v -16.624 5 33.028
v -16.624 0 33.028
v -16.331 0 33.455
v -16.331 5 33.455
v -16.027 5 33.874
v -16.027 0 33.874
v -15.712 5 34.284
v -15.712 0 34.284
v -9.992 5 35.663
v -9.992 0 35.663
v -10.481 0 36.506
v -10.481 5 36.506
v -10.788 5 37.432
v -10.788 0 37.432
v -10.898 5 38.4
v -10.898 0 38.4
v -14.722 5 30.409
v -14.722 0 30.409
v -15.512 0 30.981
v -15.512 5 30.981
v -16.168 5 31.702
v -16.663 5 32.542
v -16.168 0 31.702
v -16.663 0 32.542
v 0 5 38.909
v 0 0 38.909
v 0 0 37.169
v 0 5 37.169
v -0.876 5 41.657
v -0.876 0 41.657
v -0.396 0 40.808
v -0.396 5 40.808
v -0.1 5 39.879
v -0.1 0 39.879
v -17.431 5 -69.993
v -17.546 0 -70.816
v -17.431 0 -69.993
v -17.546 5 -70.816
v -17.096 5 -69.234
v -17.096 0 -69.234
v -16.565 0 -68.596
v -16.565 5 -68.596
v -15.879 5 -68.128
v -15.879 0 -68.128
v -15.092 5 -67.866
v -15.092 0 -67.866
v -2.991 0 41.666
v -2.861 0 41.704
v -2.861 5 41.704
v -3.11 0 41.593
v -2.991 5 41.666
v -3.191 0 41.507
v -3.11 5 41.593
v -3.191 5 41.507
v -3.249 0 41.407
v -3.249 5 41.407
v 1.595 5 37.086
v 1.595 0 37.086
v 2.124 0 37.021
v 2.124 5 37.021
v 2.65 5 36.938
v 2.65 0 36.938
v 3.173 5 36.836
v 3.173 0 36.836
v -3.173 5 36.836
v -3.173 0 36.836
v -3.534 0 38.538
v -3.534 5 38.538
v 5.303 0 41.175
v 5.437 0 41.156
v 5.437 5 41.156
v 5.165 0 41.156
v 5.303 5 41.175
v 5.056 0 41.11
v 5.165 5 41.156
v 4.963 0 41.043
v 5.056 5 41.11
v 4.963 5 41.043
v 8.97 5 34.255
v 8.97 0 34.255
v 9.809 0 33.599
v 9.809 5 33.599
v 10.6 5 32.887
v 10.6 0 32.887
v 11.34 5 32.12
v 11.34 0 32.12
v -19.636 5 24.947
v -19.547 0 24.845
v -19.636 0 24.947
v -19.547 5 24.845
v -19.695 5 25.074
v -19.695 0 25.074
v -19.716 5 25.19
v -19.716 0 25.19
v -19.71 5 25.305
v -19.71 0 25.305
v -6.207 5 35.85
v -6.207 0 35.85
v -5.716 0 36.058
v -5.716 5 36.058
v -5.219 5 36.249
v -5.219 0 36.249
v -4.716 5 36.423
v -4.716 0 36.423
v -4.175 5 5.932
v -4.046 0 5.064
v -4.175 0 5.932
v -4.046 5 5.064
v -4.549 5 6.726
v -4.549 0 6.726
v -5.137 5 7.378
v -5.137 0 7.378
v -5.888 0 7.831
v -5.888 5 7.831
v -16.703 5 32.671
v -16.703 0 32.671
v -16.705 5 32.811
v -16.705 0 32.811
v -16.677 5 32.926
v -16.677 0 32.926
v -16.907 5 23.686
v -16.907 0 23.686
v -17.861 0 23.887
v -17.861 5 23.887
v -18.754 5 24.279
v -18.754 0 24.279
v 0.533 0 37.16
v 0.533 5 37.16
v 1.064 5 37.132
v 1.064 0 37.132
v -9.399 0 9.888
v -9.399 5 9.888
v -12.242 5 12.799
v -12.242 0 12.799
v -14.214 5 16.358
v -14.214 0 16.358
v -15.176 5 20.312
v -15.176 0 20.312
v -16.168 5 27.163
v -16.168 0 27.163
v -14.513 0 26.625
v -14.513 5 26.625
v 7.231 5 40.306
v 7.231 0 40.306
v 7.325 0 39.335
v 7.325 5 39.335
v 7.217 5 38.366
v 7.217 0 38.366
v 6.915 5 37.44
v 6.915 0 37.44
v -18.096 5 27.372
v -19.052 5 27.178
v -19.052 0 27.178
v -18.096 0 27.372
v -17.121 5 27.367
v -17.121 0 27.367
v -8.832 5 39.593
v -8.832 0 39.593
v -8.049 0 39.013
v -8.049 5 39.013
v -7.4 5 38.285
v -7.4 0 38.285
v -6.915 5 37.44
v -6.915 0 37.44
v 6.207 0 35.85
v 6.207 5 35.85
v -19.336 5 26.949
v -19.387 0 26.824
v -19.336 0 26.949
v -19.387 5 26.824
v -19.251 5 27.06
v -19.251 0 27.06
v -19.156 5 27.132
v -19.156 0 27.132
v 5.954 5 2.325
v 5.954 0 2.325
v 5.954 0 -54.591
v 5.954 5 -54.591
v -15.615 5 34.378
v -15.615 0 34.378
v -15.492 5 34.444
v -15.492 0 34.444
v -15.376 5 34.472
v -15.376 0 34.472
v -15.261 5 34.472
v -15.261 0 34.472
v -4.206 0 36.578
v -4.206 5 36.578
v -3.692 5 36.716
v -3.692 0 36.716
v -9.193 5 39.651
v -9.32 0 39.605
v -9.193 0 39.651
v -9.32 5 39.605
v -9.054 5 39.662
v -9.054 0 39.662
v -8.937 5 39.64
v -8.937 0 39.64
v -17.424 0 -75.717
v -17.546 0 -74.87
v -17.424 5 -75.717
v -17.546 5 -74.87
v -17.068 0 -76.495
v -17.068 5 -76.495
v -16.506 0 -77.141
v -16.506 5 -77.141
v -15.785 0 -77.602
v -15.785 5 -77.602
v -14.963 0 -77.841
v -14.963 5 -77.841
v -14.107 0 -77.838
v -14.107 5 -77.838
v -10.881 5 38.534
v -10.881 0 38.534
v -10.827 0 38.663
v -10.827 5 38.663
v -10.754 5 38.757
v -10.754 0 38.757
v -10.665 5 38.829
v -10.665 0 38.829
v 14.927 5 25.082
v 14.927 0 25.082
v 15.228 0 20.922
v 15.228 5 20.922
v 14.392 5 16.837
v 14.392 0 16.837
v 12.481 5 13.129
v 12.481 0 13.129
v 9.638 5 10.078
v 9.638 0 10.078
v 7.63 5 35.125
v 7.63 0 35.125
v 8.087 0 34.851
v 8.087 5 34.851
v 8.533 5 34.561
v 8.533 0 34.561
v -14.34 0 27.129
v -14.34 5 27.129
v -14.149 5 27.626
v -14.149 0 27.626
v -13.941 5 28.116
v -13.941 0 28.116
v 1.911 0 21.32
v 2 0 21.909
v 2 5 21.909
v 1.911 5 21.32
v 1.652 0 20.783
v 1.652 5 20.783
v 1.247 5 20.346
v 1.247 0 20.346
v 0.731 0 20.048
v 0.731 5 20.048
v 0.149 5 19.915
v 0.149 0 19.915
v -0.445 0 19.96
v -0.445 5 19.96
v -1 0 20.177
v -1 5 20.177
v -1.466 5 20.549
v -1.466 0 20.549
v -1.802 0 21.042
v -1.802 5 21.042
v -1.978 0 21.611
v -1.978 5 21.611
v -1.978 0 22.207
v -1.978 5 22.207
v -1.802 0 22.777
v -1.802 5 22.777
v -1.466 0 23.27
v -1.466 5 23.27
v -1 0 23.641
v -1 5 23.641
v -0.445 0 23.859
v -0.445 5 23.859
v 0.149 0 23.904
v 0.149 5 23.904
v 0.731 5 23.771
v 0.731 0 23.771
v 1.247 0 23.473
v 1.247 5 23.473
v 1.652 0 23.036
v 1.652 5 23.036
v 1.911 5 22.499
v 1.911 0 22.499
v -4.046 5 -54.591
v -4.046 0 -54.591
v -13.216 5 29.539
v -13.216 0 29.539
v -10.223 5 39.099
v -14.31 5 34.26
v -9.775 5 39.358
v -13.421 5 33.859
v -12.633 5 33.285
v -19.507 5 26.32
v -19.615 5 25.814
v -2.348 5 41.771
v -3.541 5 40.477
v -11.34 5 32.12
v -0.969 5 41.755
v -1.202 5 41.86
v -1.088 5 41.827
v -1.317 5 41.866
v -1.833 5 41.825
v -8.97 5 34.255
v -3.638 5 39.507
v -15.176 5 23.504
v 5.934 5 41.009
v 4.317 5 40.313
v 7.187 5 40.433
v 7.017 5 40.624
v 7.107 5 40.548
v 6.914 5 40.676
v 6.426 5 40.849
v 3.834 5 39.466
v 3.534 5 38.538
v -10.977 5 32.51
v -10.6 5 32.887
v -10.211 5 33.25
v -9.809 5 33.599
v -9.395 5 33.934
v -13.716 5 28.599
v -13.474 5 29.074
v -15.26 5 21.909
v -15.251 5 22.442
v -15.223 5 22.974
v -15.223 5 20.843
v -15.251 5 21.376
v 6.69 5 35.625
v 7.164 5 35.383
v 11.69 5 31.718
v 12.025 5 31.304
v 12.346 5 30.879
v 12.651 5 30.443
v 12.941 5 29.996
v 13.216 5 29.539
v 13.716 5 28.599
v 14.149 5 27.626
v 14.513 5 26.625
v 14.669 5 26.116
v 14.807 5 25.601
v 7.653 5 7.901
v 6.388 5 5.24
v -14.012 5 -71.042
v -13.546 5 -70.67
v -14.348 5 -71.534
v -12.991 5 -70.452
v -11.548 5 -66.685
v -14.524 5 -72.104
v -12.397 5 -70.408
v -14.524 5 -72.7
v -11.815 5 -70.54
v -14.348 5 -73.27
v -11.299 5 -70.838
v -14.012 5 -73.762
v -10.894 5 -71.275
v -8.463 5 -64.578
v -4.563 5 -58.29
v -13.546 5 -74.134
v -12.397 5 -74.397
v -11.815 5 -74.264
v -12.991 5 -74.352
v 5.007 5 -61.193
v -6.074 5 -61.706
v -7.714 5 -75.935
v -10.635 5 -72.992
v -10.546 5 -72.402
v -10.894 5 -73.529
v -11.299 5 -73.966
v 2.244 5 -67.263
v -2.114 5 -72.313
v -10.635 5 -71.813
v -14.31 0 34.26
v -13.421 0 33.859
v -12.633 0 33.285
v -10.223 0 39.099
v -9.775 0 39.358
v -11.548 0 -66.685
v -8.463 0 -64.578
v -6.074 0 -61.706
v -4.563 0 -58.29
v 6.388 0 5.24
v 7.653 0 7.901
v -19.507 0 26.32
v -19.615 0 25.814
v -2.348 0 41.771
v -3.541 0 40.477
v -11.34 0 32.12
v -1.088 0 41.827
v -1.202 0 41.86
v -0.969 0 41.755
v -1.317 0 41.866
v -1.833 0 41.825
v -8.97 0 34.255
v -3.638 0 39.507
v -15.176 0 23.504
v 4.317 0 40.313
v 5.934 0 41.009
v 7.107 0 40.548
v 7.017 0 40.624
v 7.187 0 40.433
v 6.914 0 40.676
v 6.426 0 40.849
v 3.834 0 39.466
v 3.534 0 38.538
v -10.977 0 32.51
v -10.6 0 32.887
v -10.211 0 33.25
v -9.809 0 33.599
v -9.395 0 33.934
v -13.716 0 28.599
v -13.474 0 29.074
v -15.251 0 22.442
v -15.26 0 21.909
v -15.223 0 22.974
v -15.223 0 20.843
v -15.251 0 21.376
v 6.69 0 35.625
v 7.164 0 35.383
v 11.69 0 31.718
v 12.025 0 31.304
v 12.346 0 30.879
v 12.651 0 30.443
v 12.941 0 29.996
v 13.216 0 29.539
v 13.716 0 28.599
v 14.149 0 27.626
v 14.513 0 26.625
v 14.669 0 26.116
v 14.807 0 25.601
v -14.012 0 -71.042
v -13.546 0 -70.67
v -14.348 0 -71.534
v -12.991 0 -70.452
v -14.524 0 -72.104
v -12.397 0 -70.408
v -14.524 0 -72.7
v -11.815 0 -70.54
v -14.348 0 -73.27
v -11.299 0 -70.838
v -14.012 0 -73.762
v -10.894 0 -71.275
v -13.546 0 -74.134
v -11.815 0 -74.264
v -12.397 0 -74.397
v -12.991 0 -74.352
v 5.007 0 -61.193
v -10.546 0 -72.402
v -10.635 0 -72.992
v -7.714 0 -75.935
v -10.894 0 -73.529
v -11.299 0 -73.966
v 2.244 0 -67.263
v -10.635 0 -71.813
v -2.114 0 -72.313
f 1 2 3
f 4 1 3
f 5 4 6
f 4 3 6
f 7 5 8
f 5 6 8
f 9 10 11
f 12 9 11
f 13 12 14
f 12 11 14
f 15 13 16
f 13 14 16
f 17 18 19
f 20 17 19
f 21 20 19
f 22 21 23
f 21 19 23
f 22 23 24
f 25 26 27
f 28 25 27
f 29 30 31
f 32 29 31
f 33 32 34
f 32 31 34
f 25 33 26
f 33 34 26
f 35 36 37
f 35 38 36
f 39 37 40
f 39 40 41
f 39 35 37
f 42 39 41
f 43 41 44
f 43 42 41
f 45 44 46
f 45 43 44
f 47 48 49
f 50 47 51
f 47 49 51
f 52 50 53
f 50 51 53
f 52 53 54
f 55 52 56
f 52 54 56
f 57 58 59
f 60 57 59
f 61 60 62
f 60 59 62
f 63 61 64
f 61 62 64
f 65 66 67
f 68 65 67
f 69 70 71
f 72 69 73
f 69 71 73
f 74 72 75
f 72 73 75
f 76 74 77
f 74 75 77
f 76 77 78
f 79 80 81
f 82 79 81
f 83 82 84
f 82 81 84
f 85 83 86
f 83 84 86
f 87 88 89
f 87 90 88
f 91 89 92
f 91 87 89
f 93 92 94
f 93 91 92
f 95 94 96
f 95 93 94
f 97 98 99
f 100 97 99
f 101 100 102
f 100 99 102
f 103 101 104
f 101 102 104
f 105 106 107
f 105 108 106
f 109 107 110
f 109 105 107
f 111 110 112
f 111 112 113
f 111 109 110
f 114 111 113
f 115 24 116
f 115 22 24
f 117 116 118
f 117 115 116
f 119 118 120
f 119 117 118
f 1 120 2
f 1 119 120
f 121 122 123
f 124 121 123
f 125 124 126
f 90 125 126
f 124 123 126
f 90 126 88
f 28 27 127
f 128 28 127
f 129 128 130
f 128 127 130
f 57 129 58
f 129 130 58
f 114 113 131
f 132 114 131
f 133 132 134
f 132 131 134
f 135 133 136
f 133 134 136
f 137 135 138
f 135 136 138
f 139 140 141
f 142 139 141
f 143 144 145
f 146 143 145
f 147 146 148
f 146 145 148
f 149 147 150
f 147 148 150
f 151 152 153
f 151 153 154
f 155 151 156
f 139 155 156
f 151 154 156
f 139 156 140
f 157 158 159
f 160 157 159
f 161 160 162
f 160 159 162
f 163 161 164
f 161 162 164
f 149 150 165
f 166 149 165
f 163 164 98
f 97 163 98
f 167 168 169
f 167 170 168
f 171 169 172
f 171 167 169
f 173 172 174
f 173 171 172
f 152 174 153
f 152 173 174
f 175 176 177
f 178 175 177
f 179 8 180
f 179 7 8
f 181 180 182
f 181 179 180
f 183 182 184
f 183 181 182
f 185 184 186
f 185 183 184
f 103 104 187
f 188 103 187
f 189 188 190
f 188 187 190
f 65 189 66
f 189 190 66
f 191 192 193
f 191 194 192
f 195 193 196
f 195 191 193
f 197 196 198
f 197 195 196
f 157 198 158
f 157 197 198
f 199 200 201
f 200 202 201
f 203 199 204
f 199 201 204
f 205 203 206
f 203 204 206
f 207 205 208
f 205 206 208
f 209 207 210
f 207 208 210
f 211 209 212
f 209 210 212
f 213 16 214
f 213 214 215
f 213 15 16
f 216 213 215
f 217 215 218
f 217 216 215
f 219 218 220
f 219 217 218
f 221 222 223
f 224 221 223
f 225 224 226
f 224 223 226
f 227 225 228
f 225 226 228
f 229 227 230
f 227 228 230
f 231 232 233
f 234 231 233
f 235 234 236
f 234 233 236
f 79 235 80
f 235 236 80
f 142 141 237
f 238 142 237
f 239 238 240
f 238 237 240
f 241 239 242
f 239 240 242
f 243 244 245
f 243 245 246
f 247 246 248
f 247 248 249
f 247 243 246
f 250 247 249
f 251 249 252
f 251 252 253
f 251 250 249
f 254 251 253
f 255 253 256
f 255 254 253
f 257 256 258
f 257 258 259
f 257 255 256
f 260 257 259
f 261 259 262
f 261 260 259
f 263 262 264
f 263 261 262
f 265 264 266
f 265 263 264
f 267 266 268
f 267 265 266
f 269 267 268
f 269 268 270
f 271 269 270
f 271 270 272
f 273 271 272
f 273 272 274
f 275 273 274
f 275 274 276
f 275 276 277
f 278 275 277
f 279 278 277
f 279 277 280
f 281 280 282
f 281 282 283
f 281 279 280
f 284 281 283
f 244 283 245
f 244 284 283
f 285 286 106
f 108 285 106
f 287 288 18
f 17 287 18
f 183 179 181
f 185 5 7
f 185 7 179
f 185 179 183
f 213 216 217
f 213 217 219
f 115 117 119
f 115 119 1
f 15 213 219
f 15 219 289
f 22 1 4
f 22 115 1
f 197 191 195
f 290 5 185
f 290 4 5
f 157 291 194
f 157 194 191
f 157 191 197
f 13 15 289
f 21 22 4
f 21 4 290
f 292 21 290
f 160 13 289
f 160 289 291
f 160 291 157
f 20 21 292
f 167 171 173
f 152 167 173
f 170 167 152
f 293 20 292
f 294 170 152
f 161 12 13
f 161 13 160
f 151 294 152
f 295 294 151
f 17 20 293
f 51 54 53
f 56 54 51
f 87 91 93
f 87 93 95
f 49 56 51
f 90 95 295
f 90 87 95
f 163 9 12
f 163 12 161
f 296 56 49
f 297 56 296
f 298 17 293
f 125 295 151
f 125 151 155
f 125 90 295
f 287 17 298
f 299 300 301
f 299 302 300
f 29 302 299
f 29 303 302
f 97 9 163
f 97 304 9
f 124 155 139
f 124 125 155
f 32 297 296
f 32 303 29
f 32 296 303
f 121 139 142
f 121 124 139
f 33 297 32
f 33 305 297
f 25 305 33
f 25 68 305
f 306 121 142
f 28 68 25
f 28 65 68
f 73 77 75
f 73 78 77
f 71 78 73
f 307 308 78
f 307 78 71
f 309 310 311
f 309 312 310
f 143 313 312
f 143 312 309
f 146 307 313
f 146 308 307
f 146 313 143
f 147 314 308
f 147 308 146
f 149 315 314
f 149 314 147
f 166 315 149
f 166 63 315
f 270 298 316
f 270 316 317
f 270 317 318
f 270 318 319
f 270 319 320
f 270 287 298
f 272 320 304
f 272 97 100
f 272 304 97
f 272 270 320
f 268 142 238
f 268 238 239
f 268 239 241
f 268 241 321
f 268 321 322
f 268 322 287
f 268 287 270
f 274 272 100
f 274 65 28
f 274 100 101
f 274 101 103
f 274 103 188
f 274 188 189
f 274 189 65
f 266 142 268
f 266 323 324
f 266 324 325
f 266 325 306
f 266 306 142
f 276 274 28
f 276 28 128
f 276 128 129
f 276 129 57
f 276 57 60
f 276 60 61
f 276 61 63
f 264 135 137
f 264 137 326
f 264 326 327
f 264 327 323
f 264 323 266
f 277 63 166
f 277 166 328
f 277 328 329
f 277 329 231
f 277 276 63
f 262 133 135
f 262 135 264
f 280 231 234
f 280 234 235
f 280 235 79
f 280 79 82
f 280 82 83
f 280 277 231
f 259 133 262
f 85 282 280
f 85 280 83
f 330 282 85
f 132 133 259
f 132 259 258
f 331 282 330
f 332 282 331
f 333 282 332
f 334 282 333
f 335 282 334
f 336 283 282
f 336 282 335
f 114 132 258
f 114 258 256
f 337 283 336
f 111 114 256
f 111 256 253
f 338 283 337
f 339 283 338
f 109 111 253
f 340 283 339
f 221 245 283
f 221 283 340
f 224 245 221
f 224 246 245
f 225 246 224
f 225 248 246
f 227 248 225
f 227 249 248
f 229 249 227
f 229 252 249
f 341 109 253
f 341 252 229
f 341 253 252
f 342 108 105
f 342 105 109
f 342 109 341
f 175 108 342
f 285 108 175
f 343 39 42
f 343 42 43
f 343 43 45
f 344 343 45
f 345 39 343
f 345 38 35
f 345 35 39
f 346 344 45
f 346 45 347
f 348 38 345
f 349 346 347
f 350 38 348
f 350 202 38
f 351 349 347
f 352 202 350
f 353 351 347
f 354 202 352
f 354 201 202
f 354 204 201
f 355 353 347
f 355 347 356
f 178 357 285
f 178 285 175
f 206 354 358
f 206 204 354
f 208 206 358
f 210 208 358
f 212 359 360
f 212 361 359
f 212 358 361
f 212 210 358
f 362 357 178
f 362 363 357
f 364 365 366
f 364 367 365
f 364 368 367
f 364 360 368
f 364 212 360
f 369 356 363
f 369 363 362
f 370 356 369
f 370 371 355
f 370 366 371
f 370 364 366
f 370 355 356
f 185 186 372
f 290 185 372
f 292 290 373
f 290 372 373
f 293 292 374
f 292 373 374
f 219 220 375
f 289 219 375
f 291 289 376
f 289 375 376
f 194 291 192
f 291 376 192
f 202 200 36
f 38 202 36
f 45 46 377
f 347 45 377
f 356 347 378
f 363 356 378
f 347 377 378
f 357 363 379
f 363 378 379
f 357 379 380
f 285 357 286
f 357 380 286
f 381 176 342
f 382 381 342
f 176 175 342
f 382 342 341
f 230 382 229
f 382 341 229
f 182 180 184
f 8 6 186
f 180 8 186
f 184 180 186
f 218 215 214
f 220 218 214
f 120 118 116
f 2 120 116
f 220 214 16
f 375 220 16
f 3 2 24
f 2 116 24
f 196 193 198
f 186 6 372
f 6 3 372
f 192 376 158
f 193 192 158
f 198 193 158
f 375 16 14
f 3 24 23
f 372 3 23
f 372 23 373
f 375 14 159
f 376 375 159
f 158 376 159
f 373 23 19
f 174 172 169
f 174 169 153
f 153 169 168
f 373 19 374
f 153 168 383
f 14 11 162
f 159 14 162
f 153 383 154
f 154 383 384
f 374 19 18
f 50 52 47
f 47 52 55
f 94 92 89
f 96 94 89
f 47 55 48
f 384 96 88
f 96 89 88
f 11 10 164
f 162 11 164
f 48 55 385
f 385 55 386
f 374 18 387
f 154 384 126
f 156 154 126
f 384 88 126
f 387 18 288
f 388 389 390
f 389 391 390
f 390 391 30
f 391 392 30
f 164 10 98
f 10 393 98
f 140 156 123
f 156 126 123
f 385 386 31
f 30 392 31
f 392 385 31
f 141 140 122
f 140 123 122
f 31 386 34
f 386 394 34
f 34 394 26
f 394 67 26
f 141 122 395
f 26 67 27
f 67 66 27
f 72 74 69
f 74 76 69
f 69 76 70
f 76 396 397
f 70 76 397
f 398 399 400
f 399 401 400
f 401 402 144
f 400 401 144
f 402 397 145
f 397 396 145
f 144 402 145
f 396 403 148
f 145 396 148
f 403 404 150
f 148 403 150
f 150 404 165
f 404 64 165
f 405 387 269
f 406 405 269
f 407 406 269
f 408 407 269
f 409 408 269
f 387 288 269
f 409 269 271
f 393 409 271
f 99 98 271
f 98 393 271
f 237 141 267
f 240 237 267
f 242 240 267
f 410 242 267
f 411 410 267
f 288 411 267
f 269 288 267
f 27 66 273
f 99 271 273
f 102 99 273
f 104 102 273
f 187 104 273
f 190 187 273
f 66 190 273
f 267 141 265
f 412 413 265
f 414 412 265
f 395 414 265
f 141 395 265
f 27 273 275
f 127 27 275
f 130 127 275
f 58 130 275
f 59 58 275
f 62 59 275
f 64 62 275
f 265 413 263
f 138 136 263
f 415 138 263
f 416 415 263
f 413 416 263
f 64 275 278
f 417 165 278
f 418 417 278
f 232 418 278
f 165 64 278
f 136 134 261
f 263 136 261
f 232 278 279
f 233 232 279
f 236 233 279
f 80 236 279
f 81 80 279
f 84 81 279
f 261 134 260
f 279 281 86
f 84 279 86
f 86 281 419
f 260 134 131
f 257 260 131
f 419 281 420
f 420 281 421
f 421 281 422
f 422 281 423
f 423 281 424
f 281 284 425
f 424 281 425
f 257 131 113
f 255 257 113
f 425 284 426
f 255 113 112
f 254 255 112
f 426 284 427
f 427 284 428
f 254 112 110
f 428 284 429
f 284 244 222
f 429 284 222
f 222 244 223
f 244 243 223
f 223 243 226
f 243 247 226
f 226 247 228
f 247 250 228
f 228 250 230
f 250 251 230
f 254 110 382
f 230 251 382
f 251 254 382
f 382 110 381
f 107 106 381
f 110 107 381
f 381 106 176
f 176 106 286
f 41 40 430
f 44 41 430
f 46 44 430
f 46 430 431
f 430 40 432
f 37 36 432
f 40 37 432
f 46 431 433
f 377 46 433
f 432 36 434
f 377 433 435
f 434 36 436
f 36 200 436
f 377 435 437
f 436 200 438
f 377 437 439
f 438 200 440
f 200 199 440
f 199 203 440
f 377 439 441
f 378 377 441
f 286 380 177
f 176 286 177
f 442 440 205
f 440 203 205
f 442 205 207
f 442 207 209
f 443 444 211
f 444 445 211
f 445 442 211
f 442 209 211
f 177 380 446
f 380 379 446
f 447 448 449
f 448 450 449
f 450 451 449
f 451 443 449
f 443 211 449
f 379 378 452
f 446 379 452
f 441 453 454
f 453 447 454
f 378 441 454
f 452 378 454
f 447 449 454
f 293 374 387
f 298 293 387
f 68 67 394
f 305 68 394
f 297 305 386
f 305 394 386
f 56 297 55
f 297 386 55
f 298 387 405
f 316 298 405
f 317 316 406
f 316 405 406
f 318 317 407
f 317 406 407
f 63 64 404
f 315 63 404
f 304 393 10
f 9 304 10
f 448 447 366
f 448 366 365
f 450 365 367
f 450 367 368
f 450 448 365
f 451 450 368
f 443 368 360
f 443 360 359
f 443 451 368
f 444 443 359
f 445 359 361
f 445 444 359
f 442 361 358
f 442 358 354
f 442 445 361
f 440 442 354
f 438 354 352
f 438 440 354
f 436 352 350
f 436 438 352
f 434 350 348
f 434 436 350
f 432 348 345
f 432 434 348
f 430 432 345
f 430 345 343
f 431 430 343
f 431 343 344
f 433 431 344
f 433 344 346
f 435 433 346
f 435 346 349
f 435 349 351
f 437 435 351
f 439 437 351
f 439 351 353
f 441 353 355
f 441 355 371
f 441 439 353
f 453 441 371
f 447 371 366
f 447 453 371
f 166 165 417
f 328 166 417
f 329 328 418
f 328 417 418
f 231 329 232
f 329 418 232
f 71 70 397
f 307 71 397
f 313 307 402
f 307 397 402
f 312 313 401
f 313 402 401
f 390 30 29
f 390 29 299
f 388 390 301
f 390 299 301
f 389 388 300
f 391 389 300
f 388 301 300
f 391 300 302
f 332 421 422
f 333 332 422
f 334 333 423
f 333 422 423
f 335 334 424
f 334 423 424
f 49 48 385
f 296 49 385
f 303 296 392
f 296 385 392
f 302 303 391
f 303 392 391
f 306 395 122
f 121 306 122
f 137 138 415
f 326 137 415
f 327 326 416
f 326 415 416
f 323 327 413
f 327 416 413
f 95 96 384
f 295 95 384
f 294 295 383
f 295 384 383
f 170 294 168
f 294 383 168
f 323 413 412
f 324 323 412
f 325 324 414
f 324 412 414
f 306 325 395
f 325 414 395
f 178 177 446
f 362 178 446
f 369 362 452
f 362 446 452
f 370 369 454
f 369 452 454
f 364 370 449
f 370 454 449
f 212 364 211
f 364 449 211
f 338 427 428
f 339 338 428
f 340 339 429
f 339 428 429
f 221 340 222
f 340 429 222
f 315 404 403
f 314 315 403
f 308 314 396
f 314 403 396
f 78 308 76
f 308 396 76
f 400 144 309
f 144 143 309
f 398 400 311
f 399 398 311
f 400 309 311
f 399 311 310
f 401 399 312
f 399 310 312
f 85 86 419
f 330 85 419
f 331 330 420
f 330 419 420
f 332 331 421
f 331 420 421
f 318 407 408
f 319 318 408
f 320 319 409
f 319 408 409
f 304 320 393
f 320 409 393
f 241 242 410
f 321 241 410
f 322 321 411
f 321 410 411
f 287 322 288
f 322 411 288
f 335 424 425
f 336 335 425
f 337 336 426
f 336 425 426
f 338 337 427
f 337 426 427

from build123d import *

# Parameters (mm, degrees)
SKETCH1_R           = 2
BOSS_EXTRUDE3_DEPTH = 5
FILLET9_R           = 10
FILLET10_R          = 3
FILLET11_R          = 3
FILLET12_R          = 3
FILLET13_R          = 0.5


with BuildPart() as part:
    # Sketch1 → Boss-Extrude3 (new body)
    with BuildSketch(Plane(origin=(0, 0, 0), x_dir=(1, 0, 0), z_dir=(0, 1, 0))):
        with BuildLine():
            Line((-4.046119318, 54.590604732), (-4.046119318, -7.195574606))
            ThreePointArc((-4.046119318, -7.195574606), (-11.635335702, -12.035866866), (-15.176119318, -20.311583503))
            ThreePointArc((-15.176119318, -20.311583503), (-15.239015435, -21.109389908), (-15.26, -21.909396551))
            ThreePointArc((-15.26, -21.909396551), (-15.239086668, -22.708042569), (-15.17640413, -23.504499555))
            Line((-15.17640413, -23.504499555), (-16.906872391, -23.686379161))
            ThreePointArc((-16.906872391, -23.686379161), (-18.44583537, -24.118938522), (-19.753766933, -25.038084689))
            ThreePointArc((-19.753766933, -25.038084689), (-19.56295199, -26.067629867), (-19.318516287, -27.085777598))
            ThreePointArc((-19.318516287, -27.085777598), (-17.749810888, -27.393475541), (-16.167960532, -27.162685373))
            Line((-16.167960532, -27.162685373), (-14.513122101, -26.624995641))
            ThreePointArc((-14.513122101, -26.624995641), (-14.246436916, -27.378091201), (-13.940703236, -28.116197446))
            ThreePointArc((-13.940703236, -28.116197446), (-13.596759365, -28.837290674), (-13.215547785, -29.539395055))
            Line((-13.215547785, -29.539395055), (-14.722432114, -30.409395176))
            ThreePointArc((-14.722432114, -30.409395176), (-15.952407023, -31.430510437), (-16.773411552, -32.802175926))
            ThreePointArc((-16.773411552, -32.802175926), (-16.180339688, -33.665100824), (-15.542918581, -34.49580411))
            ThreePointArc((-15.542918581, -34.49580411), (-13.984682857, -34.138850219), (-12.633461458, -33.284616422))
            Line((-12.633461458, -33.284616422), (-11.340389428, -32.120328997))
            ThreePointArc((-11.340389428, -32.120328997), (-10.790448835, -32.699845394), (-10.210932372, -33.249785918))
            ThreePointArc((-10.210932372, -33.249785918), (-9.603428978, -33.768642793), (-8.969603297, -34.25499435))
            Line((-8.969603297, -34.25499435), (-9.99234972, -35.66268407))
            ThreePointArc((-9.99234972, -35.66268407), (-10.700662735, -37.095795135), (-10.892781095, -38.682806536))
            ThreePointArc((-10.892781095, -38.682806536), (-9.999999818, -39.229903609), (-9.079809202, -39.729526311))
            ThreePointArc((-9.079809202, -39.729526311), (-7.80147625, -38.769641154), (-6.914522249, -37.439668504))
            Line((-6.914522249, -37.439668504), (-6.20680051, -35.850099247))
            ThreePointArc((-6.20680051, -35.850099247), (-5.468694229, -36.155832838), (-4.715598637, -36.422517933))
            ThreePointArc((-4.715598637, -36.422517933), (-3.94957857, -36.649423393), (-3.172733001, -36.835927528))
            Line((-3.172733001, -36.835927528), (-3.534499379, -38.53790452))
            ThreePointArc((-3.534499379, -38.53790452), (-3.598676752, -40.135213481), (-3.128689936, -41.66316212))
            ThreePointArc((-3.128689936, -41.66316212), (-2.09056923, -41.799833318), (-1.046718412, -41.881986139))
            ThreePointArc((-1.046718412, -41.881986139), (-0.269323601, -40.48514257), (6.05e-07, -38.909395406))
            Line((6.05e-07, -38.909395406), (5.43e-07, -37.169395268))
            ThreePointArc((5.43e-07, -37.169395268), (0.798647238, -37.14848194), (1.595104896, -37.085799334))
            ThreePointArc((1.595104896, -37.085799334), (2.387189815, -36.981519365), (3.172731623, -36.835927821))
            Line((3.172731623, -36.835927821), (3.534497981, -38.537904817))
            ThreePointArc((3.534497981, -38.537904817), (4.1255531, -40.023222459), (5.176380106, -41.22791215))
            ThreePointArc((5.176380106, -41.22791215), (6.180339749, -40.930525784), (7.167359489, -40.581003755))
            ThreePointArc((7.167359489, -40.581003755), (7.309397542, -38.988728703), (6.914523355, -37.439668011))
            Line((6.914523355, -37.439668011), (6.206801502, -35.850098805))
            ThreePointArc((6.206801502, -35.850098805), (6.927895349, -35.506154662), (7.630000317, -35.124942746))
            ThreePointArc((7.630000317, -35.124942746), (8.311191417, -34.707508302), (8.969602158, -34.254995178))
            ThreePointArc((8.969602158, -34.254995178), (10.210932755, -33.249785573), (11.340390155, -32.12032819))
            ThreePointArc((11.340390155, -32.12032819), (11.859247485, -31.512824296), (12.345599442, -30.87899807))
            ThreePointArc((12.345599442, -30.87899807), (12.7981126, -30.220587353), (13.215547081, -29.539396275))
            ThreePointArc((13.215547081, -29.539396275), (13.940703446, -28.116196975), (14.513122436, -26.624994609))
            ThreePointArc((14.513122436, -26.624994609), (14.740028108, -25.8589739), (14.926532387, -25.08212767))
            ThreePointArc((14.926532387, -25.08212767), (13.533608818, -14.858931995), (5.953880682, -7.858811478))
            Line((5.953880682, -7.858811478), (5.953880682, 54.590604732))
            ThreePointArc((5.953880682, 54.590604732), (-0.92910996, 71.20761409), (-17.546119318, 78.090604732))
            Line((-17.546119318, 78.090604732), (-17.546119318, 68.090604732))
            ThreePointArc((-17.546119318, 68.090604732), (-8.000177772, 64.136546278), (-4.046119318, 54.590604732))
        make_face()
        with Locations((0, -21.909395268)):
            Circle(SKETCH1_R, mode=Mode.SUBTRACT)
        with Locations((-12.546119318, 72.402117863)):
            Circle(SKETCH1_R, mode=Mode.SUBTRACT)
    extrude(amount=BOSS_EXTRUDE3_DEPTH)

    # Fillet9
    fillet9_edges = [part.edges().sort_by_distance(p)[0] for p in [
        (5.953880682, 2.5, 7.858811478),
    ]]
    fillet(fillet9_edges, radius=FILLET9_R)

    # Fillet10
    fillet10_edges = [part.edges().sort_by_distance(p)[0] for p in [
        (-4.046119318, 2.5, 7.195574606),
    ]]
    fillet(fillet10_edges, radius=FILLET10_R)

    # Fillet11
    fillet11_edges = [part.edges().sort_by_distance(p)[0] for p in [
        (-17.546119318, 2.5, -78.090604732),
    ]]
    fillet(fillet11_edges, radius=FILLET11_R)

    # Fillet12
    fillet12_edges = [part.edges().sort_by_distance(p)[0] for p in [
        (-17.546119318, 2.5, -68.090604732),
    ]]
    fillet(fillet12_edges, radius=FILLET12_R)

    # Fillet13
    fillet13_edges = [part.edges().sort_by_distance(p)[0] for p in [
        (7.167359489, 2.5, 40.581003755),
        (5.176380106, 2.5, 41.22791215),
        (-1.046718412, 2.5, 41.881986139),
        (-3.128689936, 2.5, 41.66316212),
        (-9.079809202, 2.5, 39.729526311),
        (-10.892781095, 2.5, 38.682806536),
        (-15.542918581, 2.5, 34.49580411),
        (-16.773411552, 2.5, 32.802175926),
        (-19.318516287, 2.5, 27.085777598),
        (-19.753766933, 2.5, 25.038084689),
    ]]
    fillet(fillet13_edges, radius=FILLET13_R)


solid = part.part
